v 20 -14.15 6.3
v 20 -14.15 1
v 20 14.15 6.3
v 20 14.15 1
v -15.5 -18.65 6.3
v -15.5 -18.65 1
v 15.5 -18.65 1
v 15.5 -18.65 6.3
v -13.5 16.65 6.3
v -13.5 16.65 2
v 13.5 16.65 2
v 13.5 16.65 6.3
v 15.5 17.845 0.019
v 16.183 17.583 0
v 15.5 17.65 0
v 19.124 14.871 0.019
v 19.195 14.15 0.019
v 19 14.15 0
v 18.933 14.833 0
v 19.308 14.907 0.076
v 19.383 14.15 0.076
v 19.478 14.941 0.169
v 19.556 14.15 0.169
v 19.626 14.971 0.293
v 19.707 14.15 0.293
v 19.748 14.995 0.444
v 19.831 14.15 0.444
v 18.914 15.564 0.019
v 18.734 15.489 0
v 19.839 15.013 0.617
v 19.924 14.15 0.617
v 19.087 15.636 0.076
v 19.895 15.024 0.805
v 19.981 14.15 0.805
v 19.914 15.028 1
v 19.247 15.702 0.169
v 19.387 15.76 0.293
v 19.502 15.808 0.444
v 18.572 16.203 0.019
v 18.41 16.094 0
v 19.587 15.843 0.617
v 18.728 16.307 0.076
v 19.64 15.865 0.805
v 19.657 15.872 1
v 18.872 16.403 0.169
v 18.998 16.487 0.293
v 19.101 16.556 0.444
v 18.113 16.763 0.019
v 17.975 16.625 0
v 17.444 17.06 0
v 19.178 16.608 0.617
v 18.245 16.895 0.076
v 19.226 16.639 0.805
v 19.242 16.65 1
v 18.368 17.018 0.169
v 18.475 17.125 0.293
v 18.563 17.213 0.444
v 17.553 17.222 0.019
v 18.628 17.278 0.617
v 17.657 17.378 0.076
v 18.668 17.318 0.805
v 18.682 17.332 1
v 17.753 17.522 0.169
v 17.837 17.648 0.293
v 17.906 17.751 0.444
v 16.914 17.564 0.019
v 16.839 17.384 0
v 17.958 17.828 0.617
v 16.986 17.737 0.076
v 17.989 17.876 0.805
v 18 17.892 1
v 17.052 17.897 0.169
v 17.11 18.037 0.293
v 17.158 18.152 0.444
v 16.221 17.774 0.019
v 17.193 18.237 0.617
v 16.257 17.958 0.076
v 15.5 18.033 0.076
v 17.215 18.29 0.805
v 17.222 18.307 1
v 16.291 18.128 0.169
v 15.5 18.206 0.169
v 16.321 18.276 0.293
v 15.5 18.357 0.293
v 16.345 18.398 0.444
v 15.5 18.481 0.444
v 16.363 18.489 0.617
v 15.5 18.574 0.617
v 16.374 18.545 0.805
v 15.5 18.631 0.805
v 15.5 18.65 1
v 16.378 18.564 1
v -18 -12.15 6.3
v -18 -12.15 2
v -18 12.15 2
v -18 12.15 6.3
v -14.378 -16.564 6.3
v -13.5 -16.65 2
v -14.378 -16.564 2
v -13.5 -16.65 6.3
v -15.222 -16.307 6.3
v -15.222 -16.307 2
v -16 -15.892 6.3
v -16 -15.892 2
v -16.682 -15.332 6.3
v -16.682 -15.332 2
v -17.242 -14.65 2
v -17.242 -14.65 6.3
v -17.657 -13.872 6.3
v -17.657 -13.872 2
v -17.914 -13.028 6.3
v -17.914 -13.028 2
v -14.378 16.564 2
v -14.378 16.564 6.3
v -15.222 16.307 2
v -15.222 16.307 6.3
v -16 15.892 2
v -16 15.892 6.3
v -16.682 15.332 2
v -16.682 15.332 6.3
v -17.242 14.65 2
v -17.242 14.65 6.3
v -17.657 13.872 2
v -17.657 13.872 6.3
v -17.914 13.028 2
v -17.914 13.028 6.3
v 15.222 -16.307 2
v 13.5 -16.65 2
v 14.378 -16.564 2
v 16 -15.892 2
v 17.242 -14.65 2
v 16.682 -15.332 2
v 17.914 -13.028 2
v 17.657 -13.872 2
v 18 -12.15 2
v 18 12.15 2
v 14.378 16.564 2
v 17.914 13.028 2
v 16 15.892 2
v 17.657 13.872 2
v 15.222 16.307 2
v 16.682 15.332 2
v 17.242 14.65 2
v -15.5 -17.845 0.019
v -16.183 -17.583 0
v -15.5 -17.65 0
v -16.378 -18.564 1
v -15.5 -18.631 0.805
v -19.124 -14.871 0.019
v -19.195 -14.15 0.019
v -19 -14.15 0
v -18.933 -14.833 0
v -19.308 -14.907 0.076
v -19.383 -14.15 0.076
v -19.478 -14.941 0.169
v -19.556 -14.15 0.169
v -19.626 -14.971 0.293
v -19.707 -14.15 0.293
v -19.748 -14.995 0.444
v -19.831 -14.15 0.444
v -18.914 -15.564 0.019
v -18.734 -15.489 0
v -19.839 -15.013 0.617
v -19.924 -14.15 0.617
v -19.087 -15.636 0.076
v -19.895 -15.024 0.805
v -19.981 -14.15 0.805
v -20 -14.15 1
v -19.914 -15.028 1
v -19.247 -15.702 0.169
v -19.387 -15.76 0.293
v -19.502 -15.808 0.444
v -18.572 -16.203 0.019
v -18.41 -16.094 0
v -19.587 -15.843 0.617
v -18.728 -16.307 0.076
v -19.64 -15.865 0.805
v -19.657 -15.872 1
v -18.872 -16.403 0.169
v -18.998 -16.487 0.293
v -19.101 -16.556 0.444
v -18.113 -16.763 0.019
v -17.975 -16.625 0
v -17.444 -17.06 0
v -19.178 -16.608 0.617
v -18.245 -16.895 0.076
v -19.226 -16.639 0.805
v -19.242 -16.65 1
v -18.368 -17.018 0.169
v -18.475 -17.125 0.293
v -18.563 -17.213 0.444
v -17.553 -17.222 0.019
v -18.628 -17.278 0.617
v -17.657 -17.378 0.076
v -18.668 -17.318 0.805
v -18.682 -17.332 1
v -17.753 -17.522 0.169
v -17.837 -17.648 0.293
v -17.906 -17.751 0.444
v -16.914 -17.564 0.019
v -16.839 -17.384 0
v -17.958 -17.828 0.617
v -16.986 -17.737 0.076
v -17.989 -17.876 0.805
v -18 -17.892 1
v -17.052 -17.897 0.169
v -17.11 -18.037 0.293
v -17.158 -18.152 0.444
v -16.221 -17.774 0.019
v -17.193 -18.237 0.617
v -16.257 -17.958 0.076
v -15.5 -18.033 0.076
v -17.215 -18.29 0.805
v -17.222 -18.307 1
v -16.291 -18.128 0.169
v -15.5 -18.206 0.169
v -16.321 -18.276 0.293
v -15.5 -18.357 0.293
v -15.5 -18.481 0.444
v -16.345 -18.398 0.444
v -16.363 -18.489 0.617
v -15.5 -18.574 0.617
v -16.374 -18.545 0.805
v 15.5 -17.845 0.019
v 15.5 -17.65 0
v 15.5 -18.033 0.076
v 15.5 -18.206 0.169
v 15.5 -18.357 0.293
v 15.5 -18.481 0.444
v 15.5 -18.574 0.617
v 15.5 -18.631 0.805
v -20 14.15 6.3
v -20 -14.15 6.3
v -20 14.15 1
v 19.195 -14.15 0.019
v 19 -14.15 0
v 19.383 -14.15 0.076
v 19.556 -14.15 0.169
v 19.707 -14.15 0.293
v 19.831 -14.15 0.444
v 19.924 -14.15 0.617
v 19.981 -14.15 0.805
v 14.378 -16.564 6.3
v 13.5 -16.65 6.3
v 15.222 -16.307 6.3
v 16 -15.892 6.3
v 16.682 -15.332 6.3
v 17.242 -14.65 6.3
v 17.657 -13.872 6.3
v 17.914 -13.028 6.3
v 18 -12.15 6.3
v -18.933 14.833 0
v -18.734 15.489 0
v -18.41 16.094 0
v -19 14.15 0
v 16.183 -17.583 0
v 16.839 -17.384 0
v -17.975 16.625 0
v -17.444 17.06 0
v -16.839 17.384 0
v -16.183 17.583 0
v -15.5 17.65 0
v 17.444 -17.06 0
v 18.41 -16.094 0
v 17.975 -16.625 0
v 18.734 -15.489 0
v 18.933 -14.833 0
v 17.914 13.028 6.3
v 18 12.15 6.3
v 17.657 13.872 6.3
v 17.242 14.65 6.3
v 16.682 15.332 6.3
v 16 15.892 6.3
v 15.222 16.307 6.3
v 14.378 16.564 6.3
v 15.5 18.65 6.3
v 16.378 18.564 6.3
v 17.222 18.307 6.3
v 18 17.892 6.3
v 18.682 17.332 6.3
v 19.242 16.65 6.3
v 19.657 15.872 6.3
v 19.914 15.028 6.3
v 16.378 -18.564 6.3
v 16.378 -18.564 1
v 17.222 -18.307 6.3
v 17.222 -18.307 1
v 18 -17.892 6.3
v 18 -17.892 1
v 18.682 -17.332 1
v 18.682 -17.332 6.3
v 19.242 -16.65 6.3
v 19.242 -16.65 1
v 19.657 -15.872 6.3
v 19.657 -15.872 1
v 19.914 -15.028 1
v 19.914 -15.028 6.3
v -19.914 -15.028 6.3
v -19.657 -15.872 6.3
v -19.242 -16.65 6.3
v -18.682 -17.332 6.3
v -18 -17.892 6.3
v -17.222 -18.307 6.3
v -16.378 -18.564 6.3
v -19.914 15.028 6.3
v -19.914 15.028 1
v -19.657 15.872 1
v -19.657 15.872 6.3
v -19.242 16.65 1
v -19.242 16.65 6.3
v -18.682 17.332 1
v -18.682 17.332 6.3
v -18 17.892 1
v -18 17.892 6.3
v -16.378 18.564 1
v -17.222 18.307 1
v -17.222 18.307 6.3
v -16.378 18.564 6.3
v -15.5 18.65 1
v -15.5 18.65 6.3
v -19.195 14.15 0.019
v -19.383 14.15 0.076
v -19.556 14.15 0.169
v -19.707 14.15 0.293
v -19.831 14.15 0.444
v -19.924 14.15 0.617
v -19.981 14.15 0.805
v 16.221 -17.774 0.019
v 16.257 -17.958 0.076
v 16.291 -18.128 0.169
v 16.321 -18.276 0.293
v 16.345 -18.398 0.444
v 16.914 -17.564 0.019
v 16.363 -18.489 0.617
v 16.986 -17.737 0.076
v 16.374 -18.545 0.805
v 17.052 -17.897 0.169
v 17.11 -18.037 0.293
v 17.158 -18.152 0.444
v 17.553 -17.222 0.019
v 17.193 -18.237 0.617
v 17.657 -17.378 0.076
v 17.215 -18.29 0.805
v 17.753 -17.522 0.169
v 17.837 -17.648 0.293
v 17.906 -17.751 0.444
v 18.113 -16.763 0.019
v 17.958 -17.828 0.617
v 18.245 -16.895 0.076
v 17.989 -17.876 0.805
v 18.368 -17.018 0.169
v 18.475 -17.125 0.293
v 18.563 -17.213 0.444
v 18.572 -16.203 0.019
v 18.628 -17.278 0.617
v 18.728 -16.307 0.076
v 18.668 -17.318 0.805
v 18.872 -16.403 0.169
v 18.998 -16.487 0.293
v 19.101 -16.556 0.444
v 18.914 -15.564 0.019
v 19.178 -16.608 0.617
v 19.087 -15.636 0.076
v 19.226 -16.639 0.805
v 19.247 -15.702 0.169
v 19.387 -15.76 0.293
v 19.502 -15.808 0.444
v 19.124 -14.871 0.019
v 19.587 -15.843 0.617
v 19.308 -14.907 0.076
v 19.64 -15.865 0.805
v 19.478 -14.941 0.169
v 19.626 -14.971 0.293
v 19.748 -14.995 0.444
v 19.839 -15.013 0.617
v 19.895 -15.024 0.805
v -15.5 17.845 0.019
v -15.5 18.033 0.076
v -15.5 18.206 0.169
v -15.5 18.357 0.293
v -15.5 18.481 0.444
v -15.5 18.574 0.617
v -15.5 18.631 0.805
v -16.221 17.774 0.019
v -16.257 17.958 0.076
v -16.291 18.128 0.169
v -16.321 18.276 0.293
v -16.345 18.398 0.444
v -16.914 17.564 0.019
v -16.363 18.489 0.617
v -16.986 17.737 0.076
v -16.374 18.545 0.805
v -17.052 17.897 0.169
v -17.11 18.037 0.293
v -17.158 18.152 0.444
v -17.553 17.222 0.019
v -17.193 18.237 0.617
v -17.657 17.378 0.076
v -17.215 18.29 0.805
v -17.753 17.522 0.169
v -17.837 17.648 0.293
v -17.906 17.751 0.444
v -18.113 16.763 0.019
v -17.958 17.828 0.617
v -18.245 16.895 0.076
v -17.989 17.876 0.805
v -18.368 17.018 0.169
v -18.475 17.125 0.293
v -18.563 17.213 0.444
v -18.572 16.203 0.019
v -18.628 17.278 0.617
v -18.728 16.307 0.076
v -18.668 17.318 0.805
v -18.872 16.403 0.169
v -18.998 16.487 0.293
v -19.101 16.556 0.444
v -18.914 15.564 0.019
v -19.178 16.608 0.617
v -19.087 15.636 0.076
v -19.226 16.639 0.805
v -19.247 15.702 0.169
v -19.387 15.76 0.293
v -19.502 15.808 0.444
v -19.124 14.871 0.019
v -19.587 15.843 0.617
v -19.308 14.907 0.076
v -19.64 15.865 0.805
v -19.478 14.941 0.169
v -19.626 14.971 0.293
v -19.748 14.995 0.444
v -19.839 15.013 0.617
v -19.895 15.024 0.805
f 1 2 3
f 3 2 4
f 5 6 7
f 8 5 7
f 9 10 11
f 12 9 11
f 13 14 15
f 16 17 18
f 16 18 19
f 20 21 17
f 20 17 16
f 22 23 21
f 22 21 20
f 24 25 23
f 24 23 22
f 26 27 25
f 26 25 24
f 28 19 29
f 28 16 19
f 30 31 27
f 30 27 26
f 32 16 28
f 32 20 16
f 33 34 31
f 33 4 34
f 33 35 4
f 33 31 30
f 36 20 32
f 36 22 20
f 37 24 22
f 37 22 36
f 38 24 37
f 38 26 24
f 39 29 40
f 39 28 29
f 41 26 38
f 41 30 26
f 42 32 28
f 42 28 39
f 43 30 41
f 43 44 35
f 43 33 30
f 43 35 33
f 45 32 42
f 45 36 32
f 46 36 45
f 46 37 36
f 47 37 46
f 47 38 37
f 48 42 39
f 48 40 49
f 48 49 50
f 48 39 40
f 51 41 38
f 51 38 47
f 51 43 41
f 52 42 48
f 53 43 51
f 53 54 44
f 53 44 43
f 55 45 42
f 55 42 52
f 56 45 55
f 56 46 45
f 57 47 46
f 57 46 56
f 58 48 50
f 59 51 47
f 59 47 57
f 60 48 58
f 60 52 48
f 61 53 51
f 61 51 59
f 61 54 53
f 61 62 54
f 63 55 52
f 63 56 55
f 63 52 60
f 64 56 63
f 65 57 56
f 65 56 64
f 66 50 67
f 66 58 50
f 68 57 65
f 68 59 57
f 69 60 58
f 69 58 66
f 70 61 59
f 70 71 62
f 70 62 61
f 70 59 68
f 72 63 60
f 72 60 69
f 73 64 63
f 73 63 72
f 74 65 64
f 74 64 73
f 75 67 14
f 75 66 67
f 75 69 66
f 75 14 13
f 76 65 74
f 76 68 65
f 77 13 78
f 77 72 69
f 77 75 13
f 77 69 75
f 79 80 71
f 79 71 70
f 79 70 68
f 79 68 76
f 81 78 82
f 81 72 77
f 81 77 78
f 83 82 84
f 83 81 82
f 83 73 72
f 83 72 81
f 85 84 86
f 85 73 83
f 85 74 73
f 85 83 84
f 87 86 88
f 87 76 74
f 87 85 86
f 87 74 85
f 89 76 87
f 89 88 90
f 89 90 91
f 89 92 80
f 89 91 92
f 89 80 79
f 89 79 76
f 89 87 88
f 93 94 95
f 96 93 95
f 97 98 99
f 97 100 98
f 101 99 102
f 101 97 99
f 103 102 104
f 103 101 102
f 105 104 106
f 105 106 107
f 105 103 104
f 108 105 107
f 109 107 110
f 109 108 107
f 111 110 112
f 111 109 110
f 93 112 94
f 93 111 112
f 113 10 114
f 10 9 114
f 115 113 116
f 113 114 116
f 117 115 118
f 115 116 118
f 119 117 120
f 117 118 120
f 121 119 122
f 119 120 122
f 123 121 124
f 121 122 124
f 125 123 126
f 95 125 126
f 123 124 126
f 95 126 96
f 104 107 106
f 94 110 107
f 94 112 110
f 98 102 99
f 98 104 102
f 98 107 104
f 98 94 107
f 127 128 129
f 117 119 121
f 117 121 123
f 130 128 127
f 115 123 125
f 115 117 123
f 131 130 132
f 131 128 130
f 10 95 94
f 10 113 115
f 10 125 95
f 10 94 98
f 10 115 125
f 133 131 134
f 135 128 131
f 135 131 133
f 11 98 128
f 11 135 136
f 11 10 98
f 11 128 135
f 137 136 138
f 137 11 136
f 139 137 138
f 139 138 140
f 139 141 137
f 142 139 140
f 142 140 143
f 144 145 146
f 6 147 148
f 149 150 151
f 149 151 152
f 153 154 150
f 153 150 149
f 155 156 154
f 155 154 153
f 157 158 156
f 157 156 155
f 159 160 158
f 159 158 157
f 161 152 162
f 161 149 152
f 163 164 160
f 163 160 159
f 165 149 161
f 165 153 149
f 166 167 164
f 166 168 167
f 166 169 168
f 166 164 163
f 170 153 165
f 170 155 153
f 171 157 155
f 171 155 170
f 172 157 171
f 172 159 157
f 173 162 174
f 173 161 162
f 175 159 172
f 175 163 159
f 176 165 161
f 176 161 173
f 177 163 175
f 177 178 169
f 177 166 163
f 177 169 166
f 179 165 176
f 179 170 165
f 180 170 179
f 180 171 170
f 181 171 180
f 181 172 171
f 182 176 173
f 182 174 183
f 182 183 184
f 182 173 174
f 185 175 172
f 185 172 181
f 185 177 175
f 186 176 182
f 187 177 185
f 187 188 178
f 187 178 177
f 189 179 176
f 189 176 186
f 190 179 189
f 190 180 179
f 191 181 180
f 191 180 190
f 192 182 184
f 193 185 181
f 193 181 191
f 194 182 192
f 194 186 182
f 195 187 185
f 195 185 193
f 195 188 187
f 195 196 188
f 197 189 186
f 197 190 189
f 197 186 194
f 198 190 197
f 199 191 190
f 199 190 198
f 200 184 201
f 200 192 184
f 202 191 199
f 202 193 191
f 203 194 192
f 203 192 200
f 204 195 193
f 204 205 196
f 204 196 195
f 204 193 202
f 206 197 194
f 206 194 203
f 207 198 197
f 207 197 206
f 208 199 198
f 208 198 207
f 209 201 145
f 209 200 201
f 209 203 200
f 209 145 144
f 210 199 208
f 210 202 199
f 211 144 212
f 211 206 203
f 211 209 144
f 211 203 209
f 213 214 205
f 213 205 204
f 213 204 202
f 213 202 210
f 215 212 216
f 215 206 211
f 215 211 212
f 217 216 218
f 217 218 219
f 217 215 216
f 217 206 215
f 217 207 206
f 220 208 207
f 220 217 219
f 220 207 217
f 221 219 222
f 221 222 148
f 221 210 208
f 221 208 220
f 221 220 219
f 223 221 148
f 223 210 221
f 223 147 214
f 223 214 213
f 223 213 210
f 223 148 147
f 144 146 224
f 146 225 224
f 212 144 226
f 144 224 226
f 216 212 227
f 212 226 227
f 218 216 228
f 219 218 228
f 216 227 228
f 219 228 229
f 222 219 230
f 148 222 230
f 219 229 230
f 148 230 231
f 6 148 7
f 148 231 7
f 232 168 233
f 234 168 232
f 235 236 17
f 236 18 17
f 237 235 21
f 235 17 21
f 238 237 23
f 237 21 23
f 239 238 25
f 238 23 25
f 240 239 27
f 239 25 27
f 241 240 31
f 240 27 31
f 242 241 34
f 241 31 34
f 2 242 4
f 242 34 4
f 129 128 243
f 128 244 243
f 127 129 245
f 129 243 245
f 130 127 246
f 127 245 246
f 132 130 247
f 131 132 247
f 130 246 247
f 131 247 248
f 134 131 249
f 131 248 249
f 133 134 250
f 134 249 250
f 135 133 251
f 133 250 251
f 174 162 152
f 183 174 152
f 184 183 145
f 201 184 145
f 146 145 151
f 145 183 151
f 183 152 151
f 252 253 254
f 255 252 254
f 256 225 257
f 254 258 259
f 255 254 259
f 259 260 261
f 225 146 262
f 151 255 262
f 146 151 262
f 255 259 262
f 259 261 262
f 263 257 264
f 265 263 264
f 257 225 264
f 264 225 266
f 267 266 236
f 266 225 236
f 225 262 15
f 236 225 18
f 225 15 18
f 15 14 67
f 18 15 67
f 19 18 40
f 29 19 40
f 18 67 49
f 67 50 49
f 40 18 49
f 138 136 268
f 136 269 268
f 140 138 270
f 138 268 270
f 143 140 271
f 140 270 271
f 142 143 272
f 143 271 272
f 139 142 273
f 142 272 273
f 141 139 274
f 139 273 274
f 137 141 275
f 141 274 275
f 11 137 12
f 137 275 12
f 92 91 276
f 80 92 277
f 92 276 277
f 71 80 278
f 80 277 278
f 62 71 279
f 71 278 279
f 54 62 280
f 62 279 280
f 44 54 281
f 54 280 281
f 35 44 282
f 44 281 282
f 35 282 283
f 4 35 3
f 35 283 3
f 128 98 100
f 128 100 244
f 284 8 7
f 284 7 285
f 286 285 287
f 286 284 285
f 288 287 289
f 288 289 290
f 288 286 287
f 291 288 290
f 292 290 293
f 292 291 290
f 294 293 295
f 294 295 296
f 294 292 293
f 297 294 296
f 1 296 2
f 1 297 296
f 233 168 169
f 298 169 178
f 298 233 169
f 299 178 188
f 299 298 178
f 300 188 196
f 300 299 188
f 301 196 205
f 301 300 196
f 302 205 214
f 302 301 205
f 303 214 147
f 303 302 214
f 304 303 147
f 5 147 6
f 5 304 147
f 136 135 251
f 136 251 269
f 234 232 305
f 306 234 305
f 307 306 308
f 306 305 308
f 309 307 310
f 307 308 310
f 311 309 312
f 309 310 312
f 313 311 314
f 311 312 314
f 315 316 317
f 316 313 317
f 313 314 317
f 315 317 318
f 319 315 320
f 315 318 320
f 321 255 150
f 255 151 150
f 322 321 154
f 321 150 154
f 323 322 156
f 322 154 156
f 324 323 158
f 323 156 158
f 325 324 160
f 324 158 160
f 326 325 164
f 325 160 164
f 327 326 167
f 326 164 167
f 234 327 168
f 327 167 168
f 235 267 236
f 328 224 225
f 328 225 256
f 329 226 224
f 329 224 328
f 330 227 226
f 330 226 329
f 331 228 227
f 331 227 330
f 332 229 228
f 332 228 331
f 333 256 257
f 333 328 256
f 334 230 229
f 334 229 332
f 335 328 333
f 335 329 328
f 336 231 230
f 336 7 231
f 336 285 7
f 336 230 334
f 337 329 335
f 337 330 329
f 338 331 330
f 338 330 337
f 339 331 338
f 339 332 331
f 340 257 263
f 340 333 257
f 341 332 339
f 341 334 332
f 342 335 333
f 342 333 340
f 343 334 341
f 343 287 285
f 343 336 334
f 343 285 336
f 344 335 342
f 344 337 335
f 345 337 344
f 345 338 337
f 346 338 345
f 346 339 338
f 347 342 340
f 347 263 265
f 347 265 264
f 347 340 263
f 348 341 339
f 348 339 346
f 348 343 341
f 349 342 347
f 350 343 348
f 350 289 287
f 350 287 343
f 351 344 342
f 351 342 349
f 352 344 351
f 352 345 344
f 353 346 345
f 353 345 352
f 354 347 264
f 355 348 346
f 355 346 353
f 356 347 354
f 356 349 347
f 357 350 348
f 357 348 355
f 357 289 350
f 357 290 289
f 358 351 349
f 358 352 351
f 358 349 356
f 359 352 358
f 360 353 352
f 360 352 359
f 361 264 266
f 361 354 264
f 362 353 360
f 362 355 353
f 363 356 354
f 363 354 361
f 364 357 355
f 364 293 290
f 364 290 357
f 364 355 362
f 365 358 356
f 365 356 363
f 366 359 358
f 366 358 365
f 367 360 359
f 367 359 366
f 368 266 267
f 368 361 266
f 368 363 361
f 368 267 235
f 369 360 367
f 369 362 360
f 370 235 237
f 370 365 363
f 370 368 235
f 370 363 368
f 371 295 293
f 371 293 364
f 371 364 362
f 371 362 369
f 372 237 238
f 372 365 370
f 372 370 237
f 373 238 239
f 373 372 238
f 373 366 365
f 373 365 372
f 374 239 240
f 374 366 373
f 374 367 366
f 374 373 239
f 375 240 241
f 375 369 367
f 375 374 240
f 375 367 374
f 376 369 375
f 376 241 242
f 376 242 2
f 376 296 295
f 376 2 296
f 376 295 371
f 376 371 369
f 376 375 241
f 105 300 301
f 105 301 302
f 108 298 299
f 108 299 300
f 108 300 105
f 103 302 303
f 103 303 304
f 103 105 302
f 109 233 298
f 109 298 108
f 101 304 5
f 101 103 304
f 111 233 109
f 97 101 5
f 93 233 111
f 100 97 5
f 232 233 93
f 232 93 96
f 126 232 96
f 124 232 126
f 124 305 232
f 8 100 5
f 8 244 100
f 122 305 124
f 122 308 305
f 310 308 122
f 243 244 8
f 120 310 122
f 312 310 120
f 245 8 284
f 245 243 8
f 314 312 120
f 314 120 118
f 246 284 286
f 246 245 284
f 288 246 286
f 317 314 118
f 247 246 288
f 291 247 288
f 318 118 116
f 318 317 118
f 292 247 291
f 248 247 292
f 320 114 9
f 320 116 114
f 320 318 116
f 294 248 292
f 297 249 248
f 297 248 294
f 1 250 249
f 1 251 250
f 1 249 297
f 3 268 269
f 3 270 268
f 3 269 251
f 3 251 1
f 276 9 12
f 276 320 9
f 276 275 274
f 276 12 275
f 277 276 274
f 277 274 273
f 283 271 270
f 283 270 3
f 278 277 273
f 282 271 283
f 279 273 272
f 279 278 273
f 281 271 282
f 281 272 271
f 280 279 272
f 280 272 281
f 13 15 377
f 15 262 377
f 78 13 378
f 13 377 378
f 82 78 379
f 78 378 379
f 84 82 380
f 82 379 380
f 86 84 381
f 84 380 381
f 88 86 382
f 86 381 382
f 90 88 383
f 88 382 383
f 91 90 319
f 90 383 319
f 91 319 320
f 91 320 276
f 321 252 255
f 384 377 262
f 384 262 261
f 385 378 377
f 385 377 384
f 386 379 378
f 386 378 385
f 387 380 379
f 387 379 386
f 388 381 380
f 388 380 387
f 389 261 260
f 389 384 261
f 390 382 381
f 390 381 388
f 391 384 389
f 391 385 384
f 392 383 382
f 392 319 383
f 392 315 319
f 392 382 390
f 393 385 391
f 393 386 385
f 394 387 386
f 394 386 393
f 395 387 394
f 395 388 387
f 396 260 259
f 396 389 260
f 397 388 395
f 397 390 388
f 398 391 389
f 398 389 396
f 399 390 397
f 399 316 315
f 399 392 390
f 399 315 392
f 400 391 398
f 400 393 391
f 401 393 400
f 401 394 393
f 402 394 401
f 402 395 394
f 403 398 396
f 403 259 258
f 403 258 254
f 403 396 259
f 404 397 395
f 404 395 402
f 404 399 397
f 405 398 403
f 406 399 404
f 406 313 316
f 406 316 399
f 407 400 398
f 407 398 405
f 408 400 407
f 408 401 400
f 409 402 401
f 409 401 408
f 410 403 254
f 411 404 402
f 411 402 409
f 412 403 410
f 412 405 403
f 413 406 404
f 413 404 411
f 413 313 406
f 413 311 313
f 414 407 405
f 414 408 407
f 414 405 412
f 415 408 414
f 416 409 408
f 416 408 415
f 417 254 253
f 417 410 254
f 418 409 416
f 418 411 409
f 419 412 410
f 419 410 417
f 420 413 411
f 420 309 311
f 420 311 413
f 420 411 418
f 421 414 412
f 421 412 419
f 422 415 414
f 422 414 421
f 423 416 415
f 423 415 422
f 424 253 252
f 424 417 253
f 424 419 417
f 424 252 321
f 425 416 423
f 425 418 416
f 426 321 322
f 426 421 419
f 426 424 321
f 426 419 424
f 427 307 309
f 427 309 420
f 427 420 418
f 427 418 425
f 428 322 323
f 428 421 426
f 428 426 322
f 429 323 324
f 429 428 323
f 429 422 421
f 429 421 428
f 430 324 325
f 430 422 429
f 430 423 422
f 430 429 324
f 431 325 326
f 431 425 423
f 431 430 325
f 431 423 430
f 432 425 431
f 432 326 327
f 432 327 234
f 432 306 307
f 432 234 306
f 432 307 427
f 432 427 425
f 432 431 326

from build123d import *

# Parameters (mm, degrees)
F0_W     = 40
F0_H     = 37.3
F0_W_2   = 36
F0_H_2   = 33.3
F1_DEPTH = 6.3
F2_DEPTH = 2
F3_R     = 4.5
F4_R     = 1


with BuildPart() as f1:
    # F0 (on Top) → F1 (new body)
    with BuildSketch(Plane.XY):
        Rectangle(F0_W, F0_H)
        Rectangle(F0_W_2, F0_H_2, mode=Mode.SUBTRACT)
    extrude(amount=F1_DEPTH)

    # F0 (on Top) → F2 (join)
    with BuildSketch(Plane.XY):
        Rectangle(F0_W_2, F0_H_2)
    extrude(amount=F2_DEPTH)

    # F3
    f3_edges = [f1.edges().sort_by_distance(p)[0] for p in [
        (-18, 16.65, 4.15),
        (18, 16.65, 4.15),
        (18, -16.65, 4.15),
        (-18, -16.65, 4.15),
        (-20, -18.65, 3.15),
        (20, -18.65, 3.15),
        (20, 18.65, 3.15),
        (-20, 18.65, 3.15),
    ]]
    fillet(f3_edges, radius=F3_R)

    # F4
    f4_edges = [f1.edges().sort_by_distance(p)[0] for p in [
        (0, -18.65, 0),
    ]]
    fillet(f4_edges, radius=F4_R)


solid = f1.part
